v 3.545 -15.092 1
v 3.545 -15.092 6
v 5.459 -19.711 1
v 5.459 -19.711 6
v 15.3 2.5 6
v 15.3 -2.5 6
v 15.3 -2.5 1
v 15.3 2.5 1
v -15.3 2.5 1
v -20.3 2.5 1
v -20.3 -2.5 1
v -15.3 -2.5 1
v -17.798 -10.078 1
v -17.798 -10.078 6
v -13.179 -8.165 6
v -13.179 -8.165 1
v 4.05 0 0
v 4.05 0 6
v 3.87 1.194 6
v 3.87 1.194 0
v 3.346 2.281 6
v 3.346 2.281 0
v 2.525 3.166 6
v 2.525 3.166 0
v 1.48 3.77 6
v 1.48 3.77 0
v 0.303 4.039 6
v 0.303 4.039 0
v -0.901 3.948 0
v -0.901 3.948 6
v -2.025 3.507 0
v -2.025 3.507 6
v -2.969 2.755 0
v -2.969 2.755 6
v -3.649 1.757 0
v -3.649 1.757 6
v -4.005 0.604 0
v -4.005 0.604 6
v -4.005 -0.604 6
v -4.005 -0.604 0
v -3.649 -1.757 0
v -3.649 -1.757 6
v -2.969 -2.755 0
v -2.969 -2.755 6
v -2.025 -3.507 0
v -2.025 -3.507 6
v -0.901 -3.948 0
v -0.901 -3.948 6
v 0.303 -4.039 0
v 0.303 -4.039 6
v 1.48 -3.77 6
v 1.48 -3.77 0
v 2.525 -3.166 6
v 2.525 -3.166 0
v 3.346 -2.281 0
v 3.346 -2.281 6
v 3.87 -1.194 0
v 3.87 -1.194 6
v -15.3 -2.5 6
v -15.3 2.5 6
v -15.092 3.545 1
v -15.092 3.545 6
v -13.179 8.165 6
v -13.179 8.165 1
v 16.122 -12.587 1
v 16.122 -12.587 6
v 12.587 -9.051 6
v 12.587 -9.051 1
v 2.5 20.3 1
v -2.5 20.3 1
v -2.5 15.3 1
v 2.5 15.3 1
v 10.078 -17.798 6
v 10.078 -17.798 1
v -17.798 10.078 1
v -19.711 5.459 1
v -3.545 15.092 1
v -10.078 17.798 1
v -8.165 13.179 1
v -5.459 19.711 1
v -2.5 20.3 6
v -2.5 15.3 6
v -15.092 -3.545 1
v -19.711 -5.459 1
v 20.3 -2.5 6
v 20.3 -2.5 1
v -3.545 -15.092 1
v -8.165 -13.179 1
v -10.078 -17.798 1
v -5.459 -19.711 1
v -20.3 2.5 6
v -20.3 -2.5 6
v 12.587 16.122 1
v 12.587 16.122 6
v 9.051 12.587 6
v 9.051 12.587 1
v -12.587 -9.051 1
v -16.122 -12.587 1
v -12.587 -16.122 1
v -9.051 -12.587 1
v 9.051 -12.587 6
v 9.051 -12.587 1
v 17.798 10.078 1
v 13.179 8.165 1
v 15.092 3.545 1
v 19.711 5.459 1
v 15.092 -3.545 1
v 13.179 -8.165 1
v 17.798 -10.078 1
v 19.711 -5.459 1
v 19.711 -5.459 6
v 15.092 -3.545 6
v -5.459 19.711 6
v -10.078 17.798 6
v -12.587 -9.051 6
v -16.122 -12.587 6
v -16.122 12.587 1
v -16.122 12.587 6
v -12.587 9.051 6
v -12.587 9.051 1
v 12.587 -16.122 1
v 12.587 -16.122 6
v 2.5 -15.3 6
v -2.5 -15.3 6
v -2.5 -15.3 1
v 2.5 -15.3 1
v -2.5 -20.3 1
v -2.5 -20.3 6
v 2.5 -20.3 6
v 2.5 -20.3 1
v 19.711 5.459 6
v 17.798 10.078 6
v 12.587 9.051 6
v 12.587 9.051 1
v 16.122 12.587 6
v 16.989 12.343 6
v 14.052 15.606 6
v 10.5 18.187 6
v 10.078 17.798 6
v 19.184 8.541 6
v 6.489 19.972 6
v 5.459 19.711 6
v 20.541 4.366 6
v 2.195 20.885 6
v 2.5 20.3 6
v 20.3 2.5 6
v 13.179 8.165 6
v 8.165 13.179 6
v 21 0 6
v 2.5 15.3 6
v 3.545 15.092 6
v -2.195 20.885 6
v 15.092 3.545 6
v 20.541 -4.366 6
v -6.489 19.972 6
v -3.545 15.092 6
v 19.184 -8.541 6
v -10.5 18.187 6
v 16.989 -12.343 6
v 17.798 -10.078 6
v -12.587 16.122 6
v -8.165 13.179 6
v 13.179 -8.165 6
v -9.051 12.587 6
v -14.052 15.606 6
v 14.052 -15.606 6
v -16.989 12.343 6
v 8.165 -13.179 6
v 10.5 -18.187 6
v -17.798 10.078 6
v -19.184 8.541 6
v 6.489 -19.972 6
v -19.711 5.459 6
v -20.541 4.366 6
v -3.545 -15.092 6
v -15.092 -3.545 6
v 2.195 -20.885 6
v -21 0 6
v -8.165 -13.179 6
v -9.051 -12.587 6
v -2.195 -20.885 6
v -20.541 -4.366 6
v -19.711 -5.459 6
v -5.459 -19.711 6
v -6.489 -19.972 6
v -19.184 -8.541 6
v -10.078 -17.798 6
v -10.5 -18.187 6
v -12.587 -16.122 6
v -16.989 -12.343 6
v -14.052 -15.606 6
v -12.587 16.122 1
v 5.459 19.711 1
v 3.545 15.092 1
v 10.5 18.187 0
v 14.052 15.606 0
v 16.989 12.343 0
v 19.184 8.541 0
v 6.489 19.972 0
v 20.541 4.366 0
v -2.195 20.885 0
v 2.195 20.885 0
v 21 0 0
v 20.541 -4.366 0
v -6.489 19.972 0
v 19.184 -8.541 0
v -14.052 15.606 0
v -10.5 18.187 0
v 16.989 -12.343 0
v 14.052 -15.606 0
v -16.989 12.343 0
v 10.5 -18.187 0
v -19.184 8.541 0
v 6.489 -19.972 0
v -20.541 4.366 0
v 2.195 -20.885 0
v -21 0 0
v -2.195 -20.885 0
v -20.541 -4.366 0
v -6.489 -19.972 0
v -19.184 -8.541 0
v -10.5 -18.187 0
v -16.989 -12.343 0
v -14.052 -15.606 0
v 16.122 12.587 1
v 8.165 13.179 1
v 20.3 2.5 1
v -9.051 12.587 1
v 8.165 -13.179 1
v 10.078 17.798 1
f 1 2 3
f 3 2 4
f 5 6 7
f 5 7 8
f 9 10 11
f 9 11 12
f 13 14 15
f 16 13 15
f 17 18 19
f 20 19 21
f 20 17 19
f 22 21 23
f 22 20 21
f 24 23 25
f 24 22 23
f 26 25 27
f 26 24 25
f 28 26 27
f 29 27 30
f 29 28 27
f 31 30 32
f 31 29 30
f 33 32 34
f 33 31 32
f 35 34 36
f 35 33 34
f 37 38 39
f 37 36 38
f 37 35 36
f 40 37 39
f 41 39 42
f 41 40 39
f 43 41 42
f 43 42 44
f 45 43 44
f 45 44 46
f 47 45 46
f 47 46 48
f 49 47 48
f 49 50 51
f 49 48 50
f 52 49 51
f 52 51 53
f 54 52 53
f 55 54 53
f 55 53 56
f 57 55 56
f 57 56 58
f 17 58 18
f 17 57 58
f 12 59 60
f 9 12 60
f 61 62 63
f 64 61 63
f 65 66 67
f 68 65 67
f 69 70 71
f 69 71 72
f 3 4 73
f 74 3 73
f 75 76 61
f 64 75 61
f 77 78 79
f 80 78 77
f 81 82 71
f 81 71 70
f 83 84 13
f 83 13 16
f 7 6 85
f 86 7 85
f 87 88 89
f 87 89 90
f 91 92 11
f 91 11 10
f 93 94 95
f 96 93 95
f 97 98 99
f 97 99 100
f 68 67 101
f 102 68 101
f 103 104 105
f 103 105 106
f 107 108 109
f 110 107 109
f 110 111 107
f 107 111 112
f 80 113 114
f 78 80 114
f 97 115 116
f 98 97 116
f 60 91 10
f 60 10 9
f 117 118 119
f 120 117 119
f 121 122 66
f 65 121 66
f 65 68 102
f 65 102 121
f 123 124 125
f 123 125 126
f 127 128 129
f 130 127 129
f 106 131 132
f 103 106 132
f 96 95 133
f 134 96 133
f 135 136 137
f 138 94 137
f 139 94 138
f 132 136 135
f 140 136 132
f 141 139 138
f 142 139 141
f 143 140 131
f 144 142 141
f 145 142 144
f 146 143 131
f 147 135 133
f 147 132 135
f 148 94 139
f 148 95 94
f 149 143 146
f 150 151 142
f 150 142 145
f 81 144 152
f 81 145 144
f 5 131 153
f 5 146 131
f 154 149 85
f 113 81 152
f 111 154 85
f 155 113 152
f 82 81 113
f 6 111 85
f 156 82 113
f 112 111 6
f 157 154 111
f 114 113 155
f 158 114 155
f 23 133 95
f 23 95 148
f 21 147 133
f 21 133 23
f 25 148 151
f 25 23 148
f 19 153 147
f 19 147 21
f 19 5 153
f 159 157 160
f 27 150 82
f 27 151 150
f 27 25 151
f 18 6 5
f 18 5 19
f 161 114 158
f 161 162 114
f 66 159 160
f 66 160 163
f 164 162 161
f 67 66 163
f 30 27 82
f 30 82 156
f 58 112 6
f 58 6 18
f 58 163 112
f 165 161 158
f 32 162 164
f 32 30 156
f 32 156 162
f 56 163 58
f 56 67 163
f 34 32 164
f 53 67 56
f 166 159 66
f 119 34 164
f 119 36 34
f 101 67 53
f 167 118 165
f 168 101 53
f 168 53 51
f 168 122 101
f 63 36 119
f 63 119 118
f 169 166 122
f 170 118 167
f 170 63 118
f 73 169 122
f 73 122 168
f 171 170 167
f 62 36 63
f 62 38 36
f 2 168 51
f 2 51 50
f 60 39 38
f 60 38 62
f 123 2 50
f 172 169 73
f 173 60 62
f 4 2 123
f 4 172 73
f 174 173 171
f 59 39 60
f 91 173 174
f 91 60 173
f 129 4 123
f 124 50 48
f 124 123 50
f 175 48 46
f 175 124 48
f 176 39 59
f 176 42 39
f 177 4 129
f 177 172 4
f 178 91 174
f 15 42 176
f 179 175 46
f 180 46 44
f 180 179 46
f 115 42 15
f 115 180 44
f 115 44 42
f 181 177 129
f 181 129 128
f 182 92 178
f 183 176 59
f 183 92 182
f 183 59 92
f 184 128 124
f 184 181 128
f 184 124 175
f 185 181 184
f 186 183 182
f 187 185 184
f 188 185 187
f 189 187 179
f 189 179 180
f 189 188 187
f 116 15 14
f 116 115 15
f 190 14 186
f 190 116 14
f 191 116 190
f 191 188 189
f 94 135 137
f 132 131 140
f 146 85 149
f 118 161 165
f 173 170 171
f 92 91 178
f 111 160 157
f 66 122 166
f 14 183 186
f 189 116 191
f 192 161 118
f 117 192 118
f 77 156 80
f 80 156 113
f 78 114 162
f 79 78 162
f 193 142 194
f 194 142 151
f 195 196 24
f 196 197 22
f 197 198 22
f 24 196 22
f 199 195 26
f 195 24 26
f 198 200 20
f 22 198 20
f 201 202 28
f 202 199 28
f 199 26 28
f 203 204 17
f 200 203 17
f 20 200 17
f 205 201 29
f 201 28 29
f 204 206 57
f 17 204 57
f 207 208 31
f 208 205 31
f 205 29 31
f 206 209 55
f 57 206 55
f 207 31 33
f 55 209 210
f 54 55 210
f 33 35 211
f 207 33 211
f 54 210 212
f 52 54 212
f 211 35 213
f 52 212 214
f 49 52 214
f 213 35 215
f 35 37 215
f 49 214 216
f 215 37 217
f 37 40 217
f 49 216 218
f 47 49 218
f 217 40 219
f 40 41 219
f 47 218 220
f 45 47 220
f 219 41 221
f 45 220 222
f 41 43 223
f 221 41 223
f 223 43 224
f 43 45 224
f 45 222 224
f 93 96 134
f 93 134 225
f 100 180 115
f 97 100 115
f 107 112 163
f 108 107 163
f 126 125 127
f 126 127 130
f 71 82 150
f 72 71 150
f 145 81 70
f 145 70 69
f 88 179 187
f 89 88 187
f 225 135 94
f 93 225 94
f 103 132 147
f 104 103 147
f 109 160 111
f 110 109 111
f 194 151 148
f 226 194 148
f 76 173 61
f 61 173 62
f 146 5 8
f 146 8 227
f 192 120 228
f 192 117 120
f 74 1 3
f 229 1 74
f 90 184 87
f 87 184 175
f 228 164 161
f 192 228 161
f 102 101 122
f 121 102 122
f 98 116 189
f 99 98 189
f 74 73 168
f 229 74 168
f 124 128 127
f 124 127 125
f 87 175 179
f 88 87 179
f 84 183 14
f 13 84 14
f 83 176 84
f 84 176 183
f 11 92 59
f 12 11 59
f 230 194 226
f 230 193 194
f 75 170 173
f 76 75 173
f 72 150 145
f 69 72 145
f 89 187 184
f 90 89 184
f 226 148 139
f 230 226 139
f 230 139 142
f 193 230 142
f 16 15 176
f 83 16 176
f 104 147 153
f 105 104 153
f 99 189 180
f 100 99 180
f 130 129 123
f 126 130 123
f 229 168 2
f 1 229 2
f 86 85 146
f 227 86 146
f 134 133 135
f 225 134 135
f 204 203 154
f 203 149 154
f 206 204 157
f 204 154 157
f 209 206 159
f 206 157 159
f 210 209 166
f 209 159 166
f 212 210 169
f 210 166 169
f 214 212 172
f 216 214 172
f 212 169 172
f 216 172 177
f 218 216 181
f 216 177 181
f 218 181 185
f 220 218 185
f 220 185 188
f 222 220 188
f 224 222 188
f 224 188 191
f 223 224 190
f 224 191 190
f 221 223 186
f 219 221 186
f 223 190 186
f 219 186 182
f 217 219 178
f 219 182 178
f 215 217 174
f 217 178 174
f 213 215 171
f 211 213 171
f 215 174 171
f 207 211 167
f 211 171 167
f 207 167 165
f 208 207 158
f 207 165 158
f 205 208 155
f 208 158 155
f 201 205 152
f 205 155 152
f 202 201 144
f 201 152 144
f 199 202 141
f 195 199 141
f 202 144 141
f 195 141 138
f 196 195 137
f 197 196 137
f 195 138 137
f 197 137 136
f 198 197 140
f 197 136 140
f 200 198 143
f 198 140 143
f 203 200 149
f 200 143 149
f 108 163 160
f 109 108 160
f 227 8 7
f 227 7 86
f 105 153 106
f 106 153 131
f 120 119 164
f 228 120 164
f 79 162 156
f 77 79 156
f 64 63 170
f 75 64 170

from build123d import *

# Parameters (mm, degrees)
F0_W     = 21
F0_H     = 6
F2_R     = 4.05
F3_DEPTH = 25
F4_W     = 5
F4_H     = 5
F5_DEPTH = 5


# Not quite as in the source:
# - a feature names something its author has since deleted; it is built from what else it names


with BuildPart() as f1:
    # F0 (on Front) → F1 (revolve)
    with BuildSketch(Plane.XZ):
        with Locations((10.5, 3)):
            Rectangle(F0_W, F0_H)
    revolve(axis=Axis((0, 0, 3), (0, 0, -1)))

    # F2 (on Top) → F3 (cut)
    with BuildSketch(Plane.XY):
        Circle(F2_R)
    extrude(amount=F3_DEPTH, mode=Mode.SUBTRACT)

    # F4 (on face) → F5 (cut)
    with BuildSketch(Plane.XY.offset(6)):
        with Locations((0, 17.8)):
            Rectangle(F4_W, F4_H)
        Polygon((3.5453576839, 15.0920654283), (8.1647553465, 13.1786482665), (10.0781725083, 17.7980459291), (5.4587748457, 19.7114630909), align=None)
        Polygon((9.0509667992, 12.5865007051), (12.5865007051, 9.0509667992), (16.1220346111, 12.5865007051), (12.5865007051, 16.1220346111), align=None)
        Polygon((13.1786482665, 8.1647553465), (15.0920654283, 3.5453576839), (19.7114630909, 5.4587748457), (17.7980459291, 10.0781725083), align=None)
        with Locations((17.8, 0)):
            Rectangle(F4_W, F4_H)
        Polygon((15.0920654283, -3.5453576839), (13.1786482665, -8.1647553465), (17.7980459291, -10.0781725083), (19.7114630909, -5.4587748457), align=None)
        Polygon((12.5865007051, -9.0509667992), (9.0509667992, -12.5865007051), (12.5865007051, -16.1220346111), (16.1220346111, -12.5865007051), align=None)
        Polygon((8.1647553465, -13.1786482665), (3.5453576839, -15.0920654283), (5.4587748457, -19.7114630909), (10.0781725083, -17.7980459291), align=None)
        with Locations((0, -17.8)):
            Rectangle(F4_W, F4_H)
        Polygon((-3.5453576839, -15.0920654283), (-8.1647553465, -13.1786482665), (-10.0781725083, -17.7980459291), (-5.4587748457, -19.7114630909), align=None)
        Polygon((-9.0509667992, -12.5865007051), (-12.5865007051, -9.0509667992), (-16.1220346111, -12.5865007051), (-12.5865007051, -16.1220346111), align=None)
        Polygon((-13.1786482665, -8.1647553465), (-15.0920654283, -3.5453576839), (-19.7114630909, -5.4587748457), (-17.7980459291, -10.0781725083), align=None)
        with Locations((-17.8, 0)):
            Rectangle(F4_W, F4_H)
        Polygon((-15.0920654283, 3.5453576839), (-13.1786482665, 8.1647553465), (-17.7980459291, 10.0781725083), (-19.7114630909, 5.4587748457), align=None)
        Polygon((-12.5865007051, 9.0509667992), (-9.0509667992, 12.5865007051), (-12.5865007051, 16.1220346111), (-16.1220346111, 12.5865007051), align=None)
        Polygon((-8.1647553465, 13.1786482665), (-3.5453576839, 15.0920654283), (-5.4587748457, 19.7114630909), (-10.0781725083, 17.7980459291), align=None)
    extrude(amount=-F5_DEPTH, mode=Mode.SUBTRACT)


solid = f1.part
